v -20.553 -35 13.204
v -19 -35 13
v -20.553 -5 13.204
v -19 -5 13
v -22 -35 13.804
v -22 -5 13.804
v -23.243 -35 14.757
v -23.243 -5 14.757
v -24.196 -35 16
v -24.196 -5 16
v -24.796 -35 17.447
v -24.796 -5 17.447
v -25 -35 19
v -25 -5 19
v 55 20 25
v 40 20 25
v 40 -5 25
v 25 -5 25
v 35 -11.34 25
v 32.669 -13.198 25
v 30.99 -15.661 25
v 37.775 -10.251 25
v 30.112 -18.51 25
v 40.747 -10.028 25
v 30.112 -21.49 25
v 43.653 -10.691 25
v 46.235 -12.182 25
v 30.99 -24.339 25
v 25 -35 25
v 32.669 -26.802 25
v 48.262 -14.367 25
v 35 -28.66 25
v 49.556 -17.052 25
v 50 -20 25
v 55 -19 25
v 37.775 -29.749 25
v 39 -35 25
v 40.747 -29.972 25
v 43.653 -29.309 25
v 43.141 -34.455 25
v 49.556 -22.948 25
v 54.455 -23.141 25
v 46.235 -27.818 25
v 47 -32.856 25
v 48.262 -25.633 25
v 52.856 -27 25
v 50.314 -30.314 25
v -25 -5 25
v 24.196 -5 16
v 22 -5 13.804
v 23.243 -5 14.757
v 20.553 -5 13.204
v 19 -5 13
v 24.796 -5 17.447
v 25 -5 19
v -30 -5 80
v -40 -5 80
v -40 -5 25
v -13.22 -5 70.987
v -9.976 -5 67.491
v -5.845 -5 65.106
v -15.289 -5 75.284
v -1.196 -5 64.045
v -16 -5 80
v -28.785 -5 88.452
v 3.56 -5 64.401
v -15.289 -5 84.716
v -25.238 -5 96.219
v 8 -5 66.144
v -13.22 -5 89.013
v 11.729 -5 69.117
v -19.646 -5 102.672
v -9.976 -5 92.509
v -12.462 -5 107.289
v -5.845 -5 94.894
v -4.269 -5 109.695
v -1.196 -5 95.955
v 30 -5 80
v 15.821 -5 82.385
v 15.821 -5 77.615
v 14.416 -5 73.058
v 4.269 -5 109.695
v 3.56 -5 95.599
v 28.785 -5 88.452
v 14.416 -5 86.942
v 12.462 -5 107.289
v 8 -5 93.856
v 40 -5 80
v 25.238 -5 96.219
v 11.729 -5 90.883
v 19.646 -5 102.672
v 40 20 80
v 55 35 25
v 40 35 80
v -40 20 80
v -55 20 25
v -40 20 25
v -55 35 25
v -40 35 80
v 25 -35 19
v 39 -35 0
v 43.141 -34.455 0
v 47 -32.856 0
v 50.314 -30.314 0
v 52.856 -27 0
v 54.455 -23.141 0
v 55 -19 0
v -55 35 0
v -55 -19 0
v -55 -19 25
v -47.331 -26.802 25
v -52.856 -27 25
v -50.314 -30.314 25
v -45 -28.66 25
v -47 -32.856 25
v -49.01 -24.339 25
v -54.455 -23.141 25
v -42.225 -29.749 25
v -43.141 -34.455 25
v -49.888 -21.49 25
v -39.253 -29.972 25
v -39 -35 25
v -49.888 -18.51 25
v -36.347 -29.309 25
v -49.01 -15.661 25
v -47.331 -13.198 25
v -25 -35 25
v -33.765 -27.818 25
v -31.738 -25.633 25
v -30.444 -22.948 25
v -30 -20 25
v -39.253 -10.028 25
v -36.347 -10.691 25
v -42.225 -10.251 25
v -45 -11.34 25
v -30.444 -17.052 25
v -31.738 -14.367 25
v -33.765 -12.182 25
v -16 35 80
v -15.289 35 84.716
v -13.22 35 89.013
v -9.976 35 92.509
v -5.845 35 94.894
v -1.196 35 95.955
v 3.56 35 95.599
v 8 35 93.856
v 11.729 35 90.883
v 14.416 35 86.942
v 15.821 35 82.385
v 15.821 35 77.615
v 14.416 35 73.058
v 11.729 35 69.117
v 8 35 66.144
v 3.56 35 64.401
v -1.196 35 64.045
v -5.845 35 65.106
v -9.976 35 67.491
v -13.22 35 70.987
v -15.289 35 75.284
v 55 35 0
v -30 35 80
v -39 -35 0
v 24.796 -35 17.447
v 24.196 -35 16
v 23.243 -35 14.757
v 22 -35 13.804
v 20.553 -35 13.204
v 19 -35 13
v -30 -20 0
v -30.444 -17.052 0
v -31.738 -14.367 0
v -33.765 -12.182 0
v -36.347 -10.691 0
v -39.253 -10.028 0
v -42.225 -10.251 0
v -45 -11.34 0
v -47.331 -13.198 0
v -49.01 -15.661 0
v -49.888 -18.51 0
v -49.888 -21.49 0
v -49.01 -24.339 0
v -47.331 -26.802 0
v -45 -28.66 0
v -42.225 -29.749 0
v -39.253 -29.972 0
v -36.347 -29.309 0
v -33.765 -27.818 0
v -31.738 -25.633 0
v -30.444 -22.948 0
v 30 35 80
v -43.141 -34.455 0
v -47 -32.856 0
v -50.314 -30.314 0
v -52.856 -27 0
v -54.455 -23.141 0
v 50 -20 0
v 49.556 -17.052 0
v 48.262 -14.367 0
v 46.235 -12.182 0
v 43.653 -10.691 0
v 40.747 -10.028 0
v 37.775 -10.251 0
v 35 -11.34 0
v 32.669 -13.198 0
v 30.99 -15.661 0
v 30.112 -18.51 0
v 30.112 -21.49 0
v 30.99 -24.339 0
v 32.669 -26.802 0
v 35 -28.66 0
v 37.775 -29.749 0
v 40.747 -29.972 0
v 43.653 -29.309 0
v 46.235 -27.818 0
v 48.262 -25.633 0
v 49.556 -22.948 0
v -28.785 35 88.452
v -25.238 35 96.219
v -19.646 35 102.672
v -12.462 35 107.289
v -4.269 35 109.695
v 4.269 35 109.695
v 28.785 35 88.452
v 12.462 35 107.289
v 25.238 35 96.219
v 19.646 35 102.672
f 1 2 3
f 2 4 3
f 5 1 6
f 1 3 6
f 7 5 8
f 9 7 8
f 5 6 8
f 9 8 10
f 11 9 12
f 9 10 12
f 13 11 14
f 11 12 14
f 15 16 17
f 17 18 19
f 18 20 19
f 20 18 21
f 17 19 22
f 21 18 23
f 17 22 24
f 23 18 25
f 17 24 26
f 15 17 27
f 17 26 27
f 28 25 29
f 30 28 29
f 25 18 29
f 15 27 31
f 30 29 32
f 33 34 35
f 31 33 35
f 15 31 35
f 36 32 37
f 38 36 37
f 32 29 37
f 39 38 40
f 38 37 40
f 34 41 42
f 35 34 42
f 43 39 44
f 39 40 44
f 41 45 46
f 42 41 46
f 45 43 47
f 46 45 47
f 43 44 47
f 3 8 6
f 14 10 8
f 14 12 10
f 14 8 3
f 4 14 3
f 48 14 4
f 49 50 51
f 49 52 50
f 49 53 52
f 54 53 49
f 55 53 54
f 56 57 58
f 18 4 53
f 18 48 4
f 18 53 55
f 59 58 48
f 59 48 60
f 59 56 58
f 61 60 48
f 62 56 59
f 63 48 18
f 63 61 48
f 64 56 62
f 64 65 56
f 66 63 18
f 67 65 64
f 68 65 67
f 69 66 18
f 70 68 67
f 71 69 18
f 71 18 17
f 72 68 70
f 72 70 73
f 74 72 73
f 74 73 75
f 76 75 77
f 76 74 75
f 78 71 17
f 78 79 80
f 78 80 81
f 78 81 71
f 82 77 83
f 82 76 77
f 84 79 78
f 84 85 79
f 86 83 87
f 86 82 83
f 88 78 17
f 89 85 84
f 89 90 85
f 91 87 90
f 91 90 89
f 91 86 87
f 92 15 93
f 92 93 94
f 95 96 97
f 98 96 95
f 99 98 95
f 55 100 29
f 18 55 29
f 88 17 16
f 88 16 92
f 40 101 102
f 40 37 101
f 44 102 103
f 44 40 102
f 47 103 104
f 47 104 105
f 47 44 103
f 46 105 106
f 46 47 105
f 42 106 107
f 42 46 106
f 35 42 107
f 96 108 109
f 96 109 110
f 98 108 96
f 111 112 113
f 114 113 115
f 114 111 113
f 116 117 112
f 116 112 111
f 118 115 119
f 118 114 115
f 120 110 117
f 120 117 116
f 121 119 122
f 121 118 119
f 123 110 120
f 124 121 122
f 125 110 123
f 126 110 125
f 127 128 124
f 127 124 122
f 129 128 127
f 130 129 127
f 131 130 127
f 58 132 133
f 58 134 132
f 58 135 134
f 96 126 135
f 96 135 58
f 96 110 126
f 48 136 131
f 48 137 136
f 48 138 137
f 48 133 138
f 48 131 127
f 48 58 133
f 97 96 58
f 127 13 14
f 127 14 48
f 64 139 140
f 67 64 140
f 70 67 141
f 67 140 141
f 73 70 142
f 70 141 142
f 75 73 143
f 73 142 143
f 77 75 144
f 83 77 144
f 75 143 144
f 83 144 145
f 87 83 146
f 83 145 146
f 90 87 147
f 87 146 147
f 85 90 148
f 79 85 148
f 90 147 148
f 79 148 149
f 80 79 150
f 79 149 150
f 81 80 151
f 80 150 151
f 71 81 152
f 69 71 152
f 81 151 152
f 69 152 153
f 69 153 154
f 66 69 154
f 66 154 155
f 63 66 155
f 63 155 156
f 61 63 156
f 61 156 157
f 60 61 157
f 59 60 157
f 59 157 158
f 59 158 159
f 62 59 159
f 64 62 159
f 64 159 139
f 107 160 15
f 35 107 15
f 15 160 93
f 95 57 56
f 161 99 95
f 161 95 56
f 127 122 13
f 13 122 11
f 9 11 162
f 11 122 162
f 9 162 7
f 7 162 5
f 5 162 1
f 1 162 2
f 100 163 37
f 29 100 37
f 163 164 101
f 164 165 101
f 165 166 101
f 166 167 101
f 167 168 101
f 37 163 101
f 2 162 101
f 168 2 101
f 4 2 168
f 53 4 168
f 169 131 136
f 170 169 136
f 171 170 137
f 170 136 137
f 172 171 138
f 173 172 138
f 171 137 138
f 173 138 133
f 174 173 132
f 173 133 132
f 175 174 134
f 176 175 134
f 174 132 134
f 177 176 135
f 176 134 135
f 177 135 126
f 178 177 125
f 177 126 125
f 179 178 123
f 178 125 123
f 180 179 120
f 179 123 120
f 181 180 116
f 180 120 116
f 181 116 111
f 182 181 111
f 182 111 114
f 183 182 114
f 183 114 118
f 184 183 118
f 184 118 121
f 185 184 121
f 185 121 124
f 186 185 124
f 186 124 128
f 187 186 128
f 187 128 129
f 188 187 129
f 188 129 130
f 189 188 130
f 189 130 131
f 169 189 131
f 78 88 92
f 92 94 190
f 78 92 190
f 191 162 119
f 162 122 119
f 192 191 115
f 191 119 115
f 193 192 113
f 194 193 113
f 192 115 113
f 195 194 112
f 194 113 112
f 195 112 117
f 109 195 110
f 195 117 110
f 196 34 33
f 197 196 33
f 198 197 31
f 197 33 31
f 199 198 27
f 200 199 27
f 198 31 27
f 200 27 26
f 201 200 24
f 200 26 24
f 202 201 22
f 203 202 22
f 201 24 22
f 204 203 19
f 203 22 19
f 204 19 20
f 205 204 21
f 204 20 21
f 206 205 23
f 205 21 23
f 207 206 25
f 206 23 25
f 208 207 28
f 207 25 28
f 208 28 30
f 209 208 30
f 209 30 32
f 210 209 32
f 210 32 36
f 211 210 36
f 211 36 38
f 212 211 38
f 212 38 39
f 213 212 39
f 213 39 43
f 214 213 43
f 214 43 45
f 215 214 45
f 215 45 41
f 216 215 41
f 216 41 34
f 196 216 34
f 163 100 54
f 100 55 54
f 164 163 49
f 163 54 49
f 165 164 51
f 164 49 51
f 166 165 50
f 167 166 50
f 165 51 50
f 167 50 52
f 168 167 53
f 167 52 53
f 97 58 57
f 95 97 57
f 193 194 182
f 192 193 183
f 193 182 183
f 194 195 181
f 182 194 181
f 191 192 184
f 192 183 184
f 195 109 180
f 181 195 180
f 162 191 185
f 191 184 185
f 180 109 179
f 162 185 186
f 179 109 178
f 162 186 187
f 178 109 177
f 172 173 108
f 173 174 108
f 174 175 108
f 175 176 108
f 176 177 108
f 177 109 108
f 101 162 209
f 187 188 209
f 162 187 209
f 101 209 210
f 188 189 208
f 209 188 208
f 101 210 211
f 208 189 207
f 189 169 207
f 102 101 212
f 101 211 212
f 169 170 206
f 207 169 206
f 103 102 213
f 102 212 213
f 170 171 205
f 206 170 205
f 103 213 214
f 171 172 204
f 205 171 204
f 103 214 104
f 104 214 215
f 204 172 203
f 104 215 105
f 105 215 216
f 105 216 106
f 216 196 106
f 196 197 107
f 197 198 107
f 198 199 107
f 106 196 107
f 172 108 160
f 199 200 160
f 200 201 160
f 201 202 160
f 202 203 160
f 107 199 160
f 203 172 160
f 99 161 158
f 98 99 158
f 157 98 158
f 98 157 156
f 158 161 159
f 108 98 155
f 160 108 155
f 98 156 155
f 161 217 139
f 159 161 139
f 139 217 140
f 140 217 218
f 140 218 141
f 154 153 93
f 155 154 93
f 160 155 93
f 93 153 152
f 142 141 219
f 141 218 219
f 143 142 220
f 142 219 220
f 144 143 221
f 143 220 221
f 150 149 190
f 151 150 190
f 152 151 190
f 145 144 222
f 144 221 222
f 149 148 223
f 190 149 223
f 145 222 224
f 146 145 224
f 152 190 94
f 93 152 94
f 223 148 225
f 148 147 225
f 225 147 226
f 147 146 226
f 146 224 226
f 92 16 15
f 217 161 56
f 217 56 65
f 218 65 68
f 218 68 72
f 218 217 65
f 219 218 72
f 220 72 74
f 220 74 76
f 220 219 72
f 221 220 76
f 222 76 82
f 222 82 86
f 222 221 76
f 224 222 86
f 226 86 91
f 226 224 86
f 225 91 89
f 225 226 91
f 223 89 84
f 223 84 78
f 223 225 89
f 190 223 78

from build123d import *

# Parameters (mm, degrees)
SKETCH_W        = 110
SKETCH_H        = 70
PAD_DEPTH       = 25
SKETCH001_W     = 50
SKETCH001_H     = 12
POCKET_DEPTH    = 70.001
PAD001_DEPTH    = 40
SKETCH003_R     = 16
POCKET001_DEPTH = 70.001
SKETCH004_W     = 15
SKETCH004_H     = 55
POCKET002_DEPTH = 25
POCKET003_DEPTH = 15.001
FILLET_R        = 6
FILLET001_R     = 6
FILLET002_R     = 16
SKETCH006_R     = 10
POCKET004_DEPTH = 25.001


with BuildPart() as part:
    # Sketch → Pad (new body)
    with BuildSketch(Plane.XY):
        Rectangle(SKETCH_W, SKETCH_H)
    extrude(amount=PAD_DEPTH)

    # Sketch001 (on Face3 of Pad) → Pocket (cut, through all)
    with BuildSketch(Plane.XZ.offset(35)):
        with Locations((0, 19)):
            Rectangle(SKETCH001_W, SKETCH001_H)
    extrude(amount=-POCKET_DEPTH, mode=Mode.SUBTRACT)

    # Sketch002 (on Face1 of Pocket) → Pad001 (join)
    with BuildSketch(Plane(origin=(0, 35, 0), x_dir=(-1, 0, 0), z_dir=(0, 1, 0))):
        with BuildLine():
            Line((-55, 25), (-55, 80))
            Line((-55, 80), (-30, 80))
            ThreePointArc((30, 80), (0, 110), (-30, 80))
            Line((55, 80), (30, 80))
            Line((55, 25), (55, 80))
            Line((25, 25), (55, 25))
            Line((25, 13), (25, 25))
            Line((-25, 13), (25, 13))
            Line((-25, 25), (-25, 13))
            Line((-55, 25), (-25, 25))
        make_face()
    extrude(amount=-PAD001_DEPTH)

    # Sketch003 (on Face4 of Pad001) → Pocket001 (cut, through all)
    with BuildSketch(Plane(origin=(0, 35, 0), x_dir=(-1, 0, 0), z_dir=(0, 1, 0))):
        with Locations((0, 80)):
            Circle(SKETCH003_R)
    extrude(amount=-POCKET001_DEPTH, mode=Mode.SUBTRACT)

    # Sketch004 (on Face18 of Pocket001) → Pocket002 (cut)
    with BuildSketch(Plane.XZ.offset(5)):
        with Locations((-47.5, 52.5)):
            Rectangle(SKETCH004_W, SKETCH004_H)
        with Locations((47.5, 52.5)):
            Rectangle(SKETCH004_W, SKETCH004_H)
    extrude(amount=-POCKET002_DEPTH, mode=Mode.SUBTRACT)

    # Sketch005 (on Face24 of Pocket002) → Pocket003 (cut, through all)
    with BuildSketch(Plane.XZ.offset(-20)):
        Polygon((-55, 80), (-55, 25), (-40, 80), align=None)
        Polygon((55, 25), (40, 80), (55, 80), align=None)
    extrude(amount=-POCKET003_DEPTH, mode=Mode.SUBTRACT)

    # Fillet
    fillet_edges = [part.edges().sort_by_distance(p)[0] for p in [
        (25, -20, 13),
    ]]
    fillet(fillet_edges, radius=FILLET_R)

    # Fillet001
    fillet001_edges = [part.edges().sort_by_distance(p)[0] for p in [
        (-25, -20, 13),
    ]]
    fillet(fillet001_edges, radius=FILLET001_R)

    # Fillet002
    fillet002_edges = [part.edges().sort_by_distance(p)[0] for p in [
        (-55, -35, 12.5),
        (55, -35, 12.5),
    ]]
    fillet(fillet002_edges, radius=FILLET002_R)

    # Sketch006 (on Face2 of Fillet002) → Pocket004 (cut, through all)
    with BuildSketch(Plane.XY.offset(25)):
        with Locations((-40, -20)):
            Circle(SKETCH006_R)
        with Locations((40, -20)):
            Circle(SKETCH006_R)
    extrude(amount=-POCKET004_DEPTH, mode=Mode.SUBTRACT)


solid = part.part
